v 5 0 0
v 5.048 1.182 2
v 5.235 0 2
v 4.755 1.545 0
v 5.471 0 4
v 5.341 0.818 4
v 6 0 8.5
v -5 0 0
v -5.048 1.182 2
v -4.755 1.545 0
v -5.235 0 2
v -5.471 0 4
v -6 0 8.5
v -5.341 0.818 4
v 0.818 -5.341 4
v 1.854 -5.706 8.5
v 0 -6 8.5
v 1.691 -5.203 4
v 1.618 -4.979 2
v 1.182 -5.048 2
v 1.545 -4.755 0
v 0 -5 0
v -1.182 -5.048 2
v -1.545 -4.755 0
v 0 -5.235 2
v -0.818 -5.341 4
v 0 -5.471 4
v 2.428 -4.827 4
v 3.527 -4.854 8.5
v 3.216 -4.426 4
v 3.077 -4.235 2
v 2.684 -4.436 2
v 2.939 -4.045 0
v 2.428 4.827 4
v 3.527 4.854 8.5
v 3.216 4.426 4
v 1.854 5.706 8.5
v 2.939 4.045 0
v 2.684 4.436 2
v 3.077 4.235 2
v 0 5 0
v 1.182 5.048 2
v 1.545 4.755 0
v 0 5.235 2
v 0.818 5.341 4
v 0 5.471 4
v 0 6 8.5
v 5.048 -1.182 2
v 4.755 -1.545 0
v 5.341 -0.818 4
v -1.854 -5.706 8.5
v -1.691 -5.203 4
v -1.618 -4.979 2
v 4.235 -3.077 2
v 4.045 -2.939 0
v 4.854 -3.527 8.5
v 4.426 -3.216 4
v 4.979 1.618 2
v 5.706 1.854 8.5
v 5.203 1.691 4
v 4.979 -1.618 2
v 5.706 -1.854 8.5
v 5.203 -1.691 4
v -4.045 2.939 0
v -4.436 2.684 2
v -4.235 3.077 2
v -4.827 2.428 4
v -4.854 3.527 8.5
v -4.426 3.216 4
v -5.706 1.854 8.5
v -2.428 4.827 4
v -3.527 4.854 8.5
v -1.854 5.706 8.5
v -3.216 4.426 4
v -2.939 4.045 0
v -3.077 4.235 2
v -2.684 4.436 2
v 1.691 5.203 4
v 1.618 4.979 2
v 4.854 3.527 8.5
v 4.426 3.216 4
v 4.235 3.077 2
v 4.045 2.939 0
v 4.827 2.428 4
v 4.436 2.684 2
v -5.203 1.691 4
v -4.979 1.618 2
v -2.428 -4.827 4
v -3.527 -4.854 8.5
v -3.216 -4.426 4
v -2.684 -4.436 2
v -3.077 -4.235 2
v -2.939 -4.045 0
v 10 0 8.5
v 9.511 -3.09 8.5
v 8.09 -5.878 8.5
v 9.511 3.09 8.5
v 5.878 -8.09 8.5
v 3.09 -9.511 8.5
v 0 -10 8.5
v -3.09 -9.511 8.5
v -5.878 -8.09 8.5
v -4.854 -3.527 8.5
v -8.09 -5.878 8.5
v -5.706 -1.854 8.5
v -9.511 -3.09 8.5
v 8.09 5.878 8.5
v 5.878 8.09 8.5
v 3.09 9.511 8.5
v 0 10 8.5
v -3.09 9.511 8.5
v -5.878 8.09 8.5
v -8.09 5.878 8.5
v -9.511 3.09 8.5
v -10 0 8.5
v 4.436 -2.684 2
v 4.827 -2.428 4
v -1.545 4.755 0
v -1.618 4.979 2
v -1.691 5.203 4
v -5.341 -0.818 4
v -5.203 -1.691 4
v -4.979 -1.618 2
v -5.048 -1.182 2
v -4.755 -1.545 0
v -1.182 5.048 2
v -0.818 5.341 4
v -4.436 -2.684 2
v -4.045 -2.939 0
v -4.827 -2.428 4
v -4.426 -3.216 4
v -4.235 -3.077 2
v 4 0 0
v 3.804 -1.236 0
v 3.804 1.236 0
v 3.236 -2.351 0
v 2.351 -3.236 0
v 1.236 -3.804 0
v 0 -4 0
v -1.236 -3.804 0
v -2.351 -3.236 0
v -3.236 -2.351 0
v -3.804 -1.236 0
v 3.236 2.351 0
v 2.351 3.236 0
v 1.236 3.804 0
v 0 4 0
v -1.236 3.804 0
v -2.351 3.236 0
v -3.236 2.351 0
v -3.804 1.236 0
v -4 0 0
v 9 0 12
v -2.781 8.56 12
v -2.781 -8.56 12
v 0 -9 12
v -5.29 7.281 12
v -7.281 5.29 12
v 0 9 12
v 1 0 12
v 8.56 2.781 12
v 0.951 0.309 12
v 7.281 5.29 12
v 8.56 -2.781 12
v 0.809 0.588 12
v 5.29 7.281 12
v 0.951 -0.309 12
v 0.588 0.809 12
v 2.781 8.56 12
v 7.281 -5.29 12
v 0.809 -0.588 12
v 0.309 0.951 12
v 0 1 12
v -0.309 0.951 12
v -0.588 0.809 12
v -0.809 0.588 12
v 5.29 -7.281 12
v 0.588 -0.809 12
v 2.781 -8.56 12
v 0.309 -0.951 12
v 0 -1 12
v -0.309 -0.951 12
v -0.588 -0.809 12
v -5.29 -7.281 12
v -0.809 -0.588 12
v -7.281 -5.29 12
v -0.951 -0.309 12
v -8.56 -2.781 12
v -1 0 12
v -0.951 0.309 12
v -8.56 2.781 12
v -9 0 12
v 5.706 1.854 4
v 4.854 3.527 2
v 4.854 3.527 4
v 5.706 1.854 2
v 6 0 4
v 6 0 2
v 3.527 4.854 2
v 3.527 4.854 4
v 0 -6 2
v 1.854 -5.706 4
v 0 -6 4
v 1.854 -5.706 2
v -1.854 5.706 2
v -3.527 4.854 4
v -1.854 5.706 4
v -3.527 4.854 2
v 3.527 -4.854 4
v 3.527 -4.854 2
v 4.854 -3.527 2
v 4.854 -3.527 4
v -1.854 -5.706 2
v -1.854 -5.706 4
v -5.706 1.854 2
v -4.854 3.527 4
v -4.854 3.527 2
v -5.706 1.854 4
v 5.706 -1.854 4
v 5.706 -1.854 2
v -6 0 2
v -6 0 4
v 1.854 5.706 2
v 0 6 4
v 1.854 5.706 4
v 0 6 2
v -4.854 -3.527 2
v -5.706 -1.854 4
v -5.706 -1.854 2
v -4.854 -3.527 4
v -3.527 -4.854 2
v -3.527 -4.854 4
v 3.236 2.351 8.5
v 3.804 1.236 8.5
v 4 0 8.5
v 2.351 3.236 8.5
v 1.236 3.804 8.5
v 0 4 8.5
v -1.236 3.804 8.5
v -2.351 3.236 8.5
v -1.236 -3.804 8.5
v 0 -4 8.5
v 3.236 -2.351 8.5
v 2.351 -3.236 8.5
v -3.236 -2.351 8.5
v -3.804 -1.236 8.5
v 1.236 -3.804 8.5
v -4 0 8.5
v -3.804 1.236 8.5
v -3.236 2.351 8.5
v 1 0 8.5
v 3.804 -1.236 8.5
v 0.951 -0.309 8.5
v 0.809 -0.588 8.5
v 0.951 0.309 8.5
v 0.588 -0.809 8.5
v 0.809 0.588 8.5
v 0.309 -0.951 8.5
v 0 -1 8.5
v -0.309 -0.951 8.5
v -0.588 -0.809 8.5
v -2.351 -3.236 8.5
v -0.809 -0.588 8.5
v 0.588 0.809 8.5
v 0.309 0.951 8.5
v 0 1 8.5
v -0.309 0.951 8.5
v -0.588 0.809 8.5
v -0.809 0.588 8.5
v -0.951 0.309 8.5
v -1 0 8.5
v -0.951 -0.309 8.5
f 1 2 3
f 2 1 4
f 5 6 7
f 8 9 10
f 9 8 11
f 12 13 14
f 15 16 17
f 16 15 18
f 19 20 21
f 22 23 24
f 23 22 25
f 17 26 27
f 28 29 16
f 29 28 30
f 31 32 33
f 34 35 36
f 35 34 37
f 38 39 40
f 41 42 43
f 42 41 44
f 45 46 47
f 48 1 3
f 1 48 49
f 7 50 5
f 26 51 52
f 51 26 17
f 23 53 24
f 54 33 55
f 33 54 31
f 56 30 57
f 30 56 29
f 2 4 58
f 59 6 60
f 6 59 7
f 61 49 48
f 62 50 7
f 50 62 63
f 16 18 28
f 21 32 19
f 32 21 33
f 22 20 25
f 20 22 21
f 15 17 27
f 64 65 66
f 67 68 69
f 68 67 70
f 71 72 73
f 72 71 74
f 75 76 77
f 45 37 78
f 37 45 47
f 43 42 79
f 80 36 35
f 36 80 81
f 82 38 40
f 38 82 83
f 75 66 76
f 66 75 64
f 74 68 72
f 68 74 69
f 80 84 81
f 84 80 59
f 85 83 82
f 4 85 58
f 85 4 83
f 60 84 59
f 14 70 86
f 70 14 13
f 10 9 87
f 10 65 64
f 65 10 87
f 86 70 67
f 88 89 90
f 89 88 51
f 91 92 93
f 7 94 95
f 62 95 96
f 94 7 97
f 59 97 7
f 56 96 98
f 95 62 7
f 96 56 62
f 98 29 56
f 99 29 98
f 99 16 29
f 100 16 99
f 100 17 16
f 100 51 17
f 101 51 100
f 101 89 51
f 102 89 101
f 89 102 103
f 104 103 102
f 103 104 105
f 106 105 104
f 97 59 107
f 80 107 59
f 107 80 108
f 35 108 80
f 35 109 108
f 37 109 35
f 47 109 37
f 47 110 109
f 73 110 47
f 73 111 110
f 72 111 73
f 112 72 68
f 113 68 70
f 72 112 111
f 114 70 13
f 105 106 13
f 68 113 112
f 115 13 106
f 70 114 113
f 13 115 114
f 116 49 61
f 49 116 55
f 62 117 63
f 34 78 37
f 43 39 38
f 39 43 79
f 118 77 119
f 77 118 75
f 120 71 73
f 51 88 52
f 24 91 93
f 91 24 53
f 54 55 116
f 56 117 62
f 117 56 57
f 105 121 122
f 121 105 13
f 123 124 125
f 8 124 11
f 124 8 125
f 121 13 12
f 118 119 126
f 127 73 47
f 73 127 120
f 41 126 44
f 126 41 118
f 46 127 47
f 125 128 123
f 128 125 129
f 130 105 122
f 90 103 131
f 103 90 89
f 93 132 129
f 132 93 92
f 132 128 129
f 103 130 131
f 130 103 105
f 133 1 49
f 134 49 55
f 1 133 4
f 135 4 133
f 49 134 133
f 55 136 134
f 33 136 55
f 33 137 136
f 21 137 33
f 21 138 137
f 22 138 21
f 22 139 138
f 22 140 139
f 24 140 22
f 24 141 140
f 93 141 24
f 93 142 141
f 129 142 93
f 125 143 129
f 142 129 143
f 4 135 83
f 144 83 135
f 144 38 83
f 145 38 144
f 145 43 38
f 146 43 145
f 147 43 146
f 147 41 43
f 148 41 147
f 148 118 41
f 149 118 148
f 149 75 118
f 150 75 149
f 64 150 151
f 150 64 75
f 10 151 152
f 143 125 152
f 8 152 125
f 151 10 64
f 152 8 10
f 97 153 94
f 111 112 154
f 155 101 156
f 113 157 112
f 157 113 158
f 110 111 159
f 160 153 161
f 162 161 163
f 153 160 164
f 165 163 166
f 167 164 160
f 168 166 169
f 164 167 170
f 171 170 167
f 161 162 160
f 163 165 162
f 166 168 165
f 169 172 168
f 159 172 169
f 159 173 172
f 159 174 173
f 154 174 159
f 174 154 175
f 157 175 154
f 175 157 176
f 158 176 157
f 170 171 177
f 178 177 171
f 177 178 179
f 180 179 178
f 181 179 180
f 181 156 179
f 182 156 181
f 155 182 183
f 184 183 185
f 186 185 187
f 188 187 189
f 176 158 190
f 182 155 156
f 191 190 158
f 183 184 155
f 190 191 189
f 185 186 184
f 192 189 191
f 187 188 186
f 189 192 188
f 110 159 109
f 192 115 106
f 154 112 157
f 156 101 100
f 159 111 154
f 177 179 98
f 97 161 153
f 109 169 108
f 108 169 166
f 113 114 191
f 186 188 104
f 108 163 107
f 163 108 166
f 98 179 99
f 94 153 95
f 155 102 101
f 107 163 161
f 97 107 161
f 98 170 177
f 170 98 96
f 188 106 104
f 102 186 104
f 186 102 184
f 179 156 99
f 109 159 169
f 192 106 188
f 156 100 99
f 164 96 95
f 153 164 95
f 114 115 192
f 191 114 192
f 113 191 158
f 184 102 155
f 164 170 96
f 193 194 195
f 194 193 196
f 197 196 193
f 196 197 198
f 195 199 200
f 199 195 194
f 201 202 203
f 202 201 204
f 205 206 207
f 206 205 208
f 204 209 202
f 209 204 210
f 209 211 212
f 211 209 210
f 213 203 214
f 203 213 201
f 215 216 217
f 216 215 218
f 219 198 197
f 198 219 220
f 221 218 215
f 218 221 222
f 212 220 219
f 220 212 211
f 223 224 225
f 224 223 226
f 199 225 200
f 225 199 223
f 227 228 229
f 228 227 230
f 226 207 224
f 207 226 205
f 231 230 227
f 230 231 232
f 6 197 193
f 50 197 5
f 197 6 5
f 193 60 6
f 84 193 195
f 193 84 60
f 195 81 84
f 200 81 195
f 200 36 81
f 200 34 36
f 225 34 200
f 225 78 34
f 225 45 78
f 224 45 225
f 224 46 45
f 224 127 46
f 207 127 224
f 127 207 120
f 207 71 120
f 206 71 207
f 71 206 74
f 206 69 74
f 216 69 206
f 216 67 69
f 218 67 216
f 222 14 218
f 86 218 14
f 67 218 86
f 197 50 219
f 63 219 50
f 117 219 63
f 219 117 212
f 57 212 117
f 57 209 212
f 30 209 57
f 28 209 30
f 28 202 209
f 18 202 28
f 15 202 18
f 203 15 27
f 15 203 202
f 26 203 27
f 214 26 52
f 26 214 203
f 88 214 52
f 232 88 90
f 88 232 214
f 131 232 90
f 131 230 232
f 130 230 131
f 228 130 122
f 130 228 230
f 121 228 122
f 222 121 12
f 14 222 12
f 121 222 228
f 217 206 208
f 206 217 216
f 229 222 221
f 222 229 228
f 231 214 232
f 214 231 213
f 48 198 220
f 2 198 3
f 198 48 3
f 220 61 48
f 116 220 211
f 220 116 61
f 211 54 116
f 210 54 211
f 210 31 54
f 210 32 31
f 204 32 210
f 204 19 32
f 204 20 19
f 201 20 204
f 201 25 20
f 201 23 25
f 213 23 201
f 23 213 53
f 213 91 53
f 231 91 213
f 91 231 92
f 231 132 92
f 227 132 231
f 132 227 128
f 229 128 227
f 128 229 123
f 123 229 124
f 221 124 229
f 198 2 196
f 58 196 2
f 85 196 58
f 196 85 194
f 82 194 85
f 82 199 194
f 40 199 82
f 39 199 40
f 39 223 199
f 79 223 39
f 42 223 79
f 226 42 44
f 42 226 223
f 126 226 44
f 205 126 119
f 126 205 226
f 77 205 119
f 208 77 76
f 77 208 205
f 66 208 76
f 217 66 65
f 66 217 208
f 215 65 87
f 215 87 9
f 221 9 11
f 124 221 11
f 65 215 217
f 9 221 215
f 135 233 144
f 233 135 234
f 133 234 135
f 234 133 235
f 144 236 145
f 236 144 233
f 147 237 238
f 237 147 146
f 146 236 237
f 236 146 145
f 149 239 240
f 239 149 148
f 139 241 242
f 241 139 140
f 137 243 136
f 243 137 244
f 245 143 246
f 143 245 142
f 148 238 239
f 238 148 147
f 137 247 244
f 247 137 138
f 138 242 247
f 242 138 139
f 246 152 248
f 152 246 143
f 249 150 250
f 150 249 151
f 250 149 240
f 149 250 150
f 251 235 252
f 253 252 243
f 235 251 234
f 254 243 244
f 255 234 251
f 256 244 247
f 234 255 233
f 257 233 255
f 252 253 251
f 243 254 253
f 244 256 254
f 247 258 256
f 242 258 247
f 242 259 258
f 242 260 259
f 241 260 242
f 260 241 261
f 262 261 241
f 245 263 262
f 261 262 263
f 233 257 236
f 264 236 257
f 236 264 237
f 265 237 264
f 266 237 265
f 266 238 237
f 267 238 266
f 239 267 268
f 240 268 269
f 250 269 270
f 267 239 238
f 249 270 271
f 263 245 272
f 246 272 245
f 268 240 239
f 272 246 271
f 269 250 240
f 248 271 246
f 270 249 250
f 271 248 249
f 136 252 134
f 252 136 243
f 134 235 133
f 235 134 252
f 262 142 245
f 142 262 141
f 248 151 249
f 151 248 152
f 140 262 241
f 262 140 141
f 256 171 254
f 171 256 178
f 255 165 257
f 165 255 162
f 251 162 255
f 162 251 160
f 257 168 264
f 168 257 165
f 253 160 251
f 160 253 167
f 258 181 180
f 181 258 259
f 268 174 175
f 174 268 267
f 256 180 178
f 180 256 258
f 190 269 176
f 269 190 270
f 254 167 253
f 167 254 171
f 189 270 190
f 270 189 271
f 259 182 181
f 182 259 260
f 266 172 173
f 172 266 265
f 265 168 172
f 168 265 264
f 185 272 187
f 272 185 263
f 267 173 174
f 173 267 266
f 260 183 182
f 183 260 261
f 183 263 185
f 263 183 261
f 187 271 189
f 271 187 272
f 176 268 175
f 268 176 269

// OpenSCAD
// openNSP_project, end caps section version 1.0
// Zexuan Qiao, 2024
// under GPL license ver3

capLOA = 12; //.1
chamber = 8.5; //.1
bore = 8; //.1
mainDiameter = 10; //.1
pin = 2; //.1
bell = 20; //.1
endOffset = 2; //.1
decoration = 2; //.1
decoPos = 2; //.1

decoDiameter = mainDiameter + 2;
/* [Utilities] */
// Segments, the higher the value, the smoother the surface would be.
$fn = 20;

difference(){
union(){
cylinder(h = chamber, d1 = mainDiameter, d2 = mainDiameter + endOffset);
translate([0,0,chamber]) cylinder(h = capLOA - chamber, d1 = bell, d2 = bell - endOffset);
translate([0,0,decoPos]) cylinder(h = decoration, d = decoDiameter);
}
cylinder(h = chamber, d = bore);
cylinder(h = capLOA, d = pin);
}
